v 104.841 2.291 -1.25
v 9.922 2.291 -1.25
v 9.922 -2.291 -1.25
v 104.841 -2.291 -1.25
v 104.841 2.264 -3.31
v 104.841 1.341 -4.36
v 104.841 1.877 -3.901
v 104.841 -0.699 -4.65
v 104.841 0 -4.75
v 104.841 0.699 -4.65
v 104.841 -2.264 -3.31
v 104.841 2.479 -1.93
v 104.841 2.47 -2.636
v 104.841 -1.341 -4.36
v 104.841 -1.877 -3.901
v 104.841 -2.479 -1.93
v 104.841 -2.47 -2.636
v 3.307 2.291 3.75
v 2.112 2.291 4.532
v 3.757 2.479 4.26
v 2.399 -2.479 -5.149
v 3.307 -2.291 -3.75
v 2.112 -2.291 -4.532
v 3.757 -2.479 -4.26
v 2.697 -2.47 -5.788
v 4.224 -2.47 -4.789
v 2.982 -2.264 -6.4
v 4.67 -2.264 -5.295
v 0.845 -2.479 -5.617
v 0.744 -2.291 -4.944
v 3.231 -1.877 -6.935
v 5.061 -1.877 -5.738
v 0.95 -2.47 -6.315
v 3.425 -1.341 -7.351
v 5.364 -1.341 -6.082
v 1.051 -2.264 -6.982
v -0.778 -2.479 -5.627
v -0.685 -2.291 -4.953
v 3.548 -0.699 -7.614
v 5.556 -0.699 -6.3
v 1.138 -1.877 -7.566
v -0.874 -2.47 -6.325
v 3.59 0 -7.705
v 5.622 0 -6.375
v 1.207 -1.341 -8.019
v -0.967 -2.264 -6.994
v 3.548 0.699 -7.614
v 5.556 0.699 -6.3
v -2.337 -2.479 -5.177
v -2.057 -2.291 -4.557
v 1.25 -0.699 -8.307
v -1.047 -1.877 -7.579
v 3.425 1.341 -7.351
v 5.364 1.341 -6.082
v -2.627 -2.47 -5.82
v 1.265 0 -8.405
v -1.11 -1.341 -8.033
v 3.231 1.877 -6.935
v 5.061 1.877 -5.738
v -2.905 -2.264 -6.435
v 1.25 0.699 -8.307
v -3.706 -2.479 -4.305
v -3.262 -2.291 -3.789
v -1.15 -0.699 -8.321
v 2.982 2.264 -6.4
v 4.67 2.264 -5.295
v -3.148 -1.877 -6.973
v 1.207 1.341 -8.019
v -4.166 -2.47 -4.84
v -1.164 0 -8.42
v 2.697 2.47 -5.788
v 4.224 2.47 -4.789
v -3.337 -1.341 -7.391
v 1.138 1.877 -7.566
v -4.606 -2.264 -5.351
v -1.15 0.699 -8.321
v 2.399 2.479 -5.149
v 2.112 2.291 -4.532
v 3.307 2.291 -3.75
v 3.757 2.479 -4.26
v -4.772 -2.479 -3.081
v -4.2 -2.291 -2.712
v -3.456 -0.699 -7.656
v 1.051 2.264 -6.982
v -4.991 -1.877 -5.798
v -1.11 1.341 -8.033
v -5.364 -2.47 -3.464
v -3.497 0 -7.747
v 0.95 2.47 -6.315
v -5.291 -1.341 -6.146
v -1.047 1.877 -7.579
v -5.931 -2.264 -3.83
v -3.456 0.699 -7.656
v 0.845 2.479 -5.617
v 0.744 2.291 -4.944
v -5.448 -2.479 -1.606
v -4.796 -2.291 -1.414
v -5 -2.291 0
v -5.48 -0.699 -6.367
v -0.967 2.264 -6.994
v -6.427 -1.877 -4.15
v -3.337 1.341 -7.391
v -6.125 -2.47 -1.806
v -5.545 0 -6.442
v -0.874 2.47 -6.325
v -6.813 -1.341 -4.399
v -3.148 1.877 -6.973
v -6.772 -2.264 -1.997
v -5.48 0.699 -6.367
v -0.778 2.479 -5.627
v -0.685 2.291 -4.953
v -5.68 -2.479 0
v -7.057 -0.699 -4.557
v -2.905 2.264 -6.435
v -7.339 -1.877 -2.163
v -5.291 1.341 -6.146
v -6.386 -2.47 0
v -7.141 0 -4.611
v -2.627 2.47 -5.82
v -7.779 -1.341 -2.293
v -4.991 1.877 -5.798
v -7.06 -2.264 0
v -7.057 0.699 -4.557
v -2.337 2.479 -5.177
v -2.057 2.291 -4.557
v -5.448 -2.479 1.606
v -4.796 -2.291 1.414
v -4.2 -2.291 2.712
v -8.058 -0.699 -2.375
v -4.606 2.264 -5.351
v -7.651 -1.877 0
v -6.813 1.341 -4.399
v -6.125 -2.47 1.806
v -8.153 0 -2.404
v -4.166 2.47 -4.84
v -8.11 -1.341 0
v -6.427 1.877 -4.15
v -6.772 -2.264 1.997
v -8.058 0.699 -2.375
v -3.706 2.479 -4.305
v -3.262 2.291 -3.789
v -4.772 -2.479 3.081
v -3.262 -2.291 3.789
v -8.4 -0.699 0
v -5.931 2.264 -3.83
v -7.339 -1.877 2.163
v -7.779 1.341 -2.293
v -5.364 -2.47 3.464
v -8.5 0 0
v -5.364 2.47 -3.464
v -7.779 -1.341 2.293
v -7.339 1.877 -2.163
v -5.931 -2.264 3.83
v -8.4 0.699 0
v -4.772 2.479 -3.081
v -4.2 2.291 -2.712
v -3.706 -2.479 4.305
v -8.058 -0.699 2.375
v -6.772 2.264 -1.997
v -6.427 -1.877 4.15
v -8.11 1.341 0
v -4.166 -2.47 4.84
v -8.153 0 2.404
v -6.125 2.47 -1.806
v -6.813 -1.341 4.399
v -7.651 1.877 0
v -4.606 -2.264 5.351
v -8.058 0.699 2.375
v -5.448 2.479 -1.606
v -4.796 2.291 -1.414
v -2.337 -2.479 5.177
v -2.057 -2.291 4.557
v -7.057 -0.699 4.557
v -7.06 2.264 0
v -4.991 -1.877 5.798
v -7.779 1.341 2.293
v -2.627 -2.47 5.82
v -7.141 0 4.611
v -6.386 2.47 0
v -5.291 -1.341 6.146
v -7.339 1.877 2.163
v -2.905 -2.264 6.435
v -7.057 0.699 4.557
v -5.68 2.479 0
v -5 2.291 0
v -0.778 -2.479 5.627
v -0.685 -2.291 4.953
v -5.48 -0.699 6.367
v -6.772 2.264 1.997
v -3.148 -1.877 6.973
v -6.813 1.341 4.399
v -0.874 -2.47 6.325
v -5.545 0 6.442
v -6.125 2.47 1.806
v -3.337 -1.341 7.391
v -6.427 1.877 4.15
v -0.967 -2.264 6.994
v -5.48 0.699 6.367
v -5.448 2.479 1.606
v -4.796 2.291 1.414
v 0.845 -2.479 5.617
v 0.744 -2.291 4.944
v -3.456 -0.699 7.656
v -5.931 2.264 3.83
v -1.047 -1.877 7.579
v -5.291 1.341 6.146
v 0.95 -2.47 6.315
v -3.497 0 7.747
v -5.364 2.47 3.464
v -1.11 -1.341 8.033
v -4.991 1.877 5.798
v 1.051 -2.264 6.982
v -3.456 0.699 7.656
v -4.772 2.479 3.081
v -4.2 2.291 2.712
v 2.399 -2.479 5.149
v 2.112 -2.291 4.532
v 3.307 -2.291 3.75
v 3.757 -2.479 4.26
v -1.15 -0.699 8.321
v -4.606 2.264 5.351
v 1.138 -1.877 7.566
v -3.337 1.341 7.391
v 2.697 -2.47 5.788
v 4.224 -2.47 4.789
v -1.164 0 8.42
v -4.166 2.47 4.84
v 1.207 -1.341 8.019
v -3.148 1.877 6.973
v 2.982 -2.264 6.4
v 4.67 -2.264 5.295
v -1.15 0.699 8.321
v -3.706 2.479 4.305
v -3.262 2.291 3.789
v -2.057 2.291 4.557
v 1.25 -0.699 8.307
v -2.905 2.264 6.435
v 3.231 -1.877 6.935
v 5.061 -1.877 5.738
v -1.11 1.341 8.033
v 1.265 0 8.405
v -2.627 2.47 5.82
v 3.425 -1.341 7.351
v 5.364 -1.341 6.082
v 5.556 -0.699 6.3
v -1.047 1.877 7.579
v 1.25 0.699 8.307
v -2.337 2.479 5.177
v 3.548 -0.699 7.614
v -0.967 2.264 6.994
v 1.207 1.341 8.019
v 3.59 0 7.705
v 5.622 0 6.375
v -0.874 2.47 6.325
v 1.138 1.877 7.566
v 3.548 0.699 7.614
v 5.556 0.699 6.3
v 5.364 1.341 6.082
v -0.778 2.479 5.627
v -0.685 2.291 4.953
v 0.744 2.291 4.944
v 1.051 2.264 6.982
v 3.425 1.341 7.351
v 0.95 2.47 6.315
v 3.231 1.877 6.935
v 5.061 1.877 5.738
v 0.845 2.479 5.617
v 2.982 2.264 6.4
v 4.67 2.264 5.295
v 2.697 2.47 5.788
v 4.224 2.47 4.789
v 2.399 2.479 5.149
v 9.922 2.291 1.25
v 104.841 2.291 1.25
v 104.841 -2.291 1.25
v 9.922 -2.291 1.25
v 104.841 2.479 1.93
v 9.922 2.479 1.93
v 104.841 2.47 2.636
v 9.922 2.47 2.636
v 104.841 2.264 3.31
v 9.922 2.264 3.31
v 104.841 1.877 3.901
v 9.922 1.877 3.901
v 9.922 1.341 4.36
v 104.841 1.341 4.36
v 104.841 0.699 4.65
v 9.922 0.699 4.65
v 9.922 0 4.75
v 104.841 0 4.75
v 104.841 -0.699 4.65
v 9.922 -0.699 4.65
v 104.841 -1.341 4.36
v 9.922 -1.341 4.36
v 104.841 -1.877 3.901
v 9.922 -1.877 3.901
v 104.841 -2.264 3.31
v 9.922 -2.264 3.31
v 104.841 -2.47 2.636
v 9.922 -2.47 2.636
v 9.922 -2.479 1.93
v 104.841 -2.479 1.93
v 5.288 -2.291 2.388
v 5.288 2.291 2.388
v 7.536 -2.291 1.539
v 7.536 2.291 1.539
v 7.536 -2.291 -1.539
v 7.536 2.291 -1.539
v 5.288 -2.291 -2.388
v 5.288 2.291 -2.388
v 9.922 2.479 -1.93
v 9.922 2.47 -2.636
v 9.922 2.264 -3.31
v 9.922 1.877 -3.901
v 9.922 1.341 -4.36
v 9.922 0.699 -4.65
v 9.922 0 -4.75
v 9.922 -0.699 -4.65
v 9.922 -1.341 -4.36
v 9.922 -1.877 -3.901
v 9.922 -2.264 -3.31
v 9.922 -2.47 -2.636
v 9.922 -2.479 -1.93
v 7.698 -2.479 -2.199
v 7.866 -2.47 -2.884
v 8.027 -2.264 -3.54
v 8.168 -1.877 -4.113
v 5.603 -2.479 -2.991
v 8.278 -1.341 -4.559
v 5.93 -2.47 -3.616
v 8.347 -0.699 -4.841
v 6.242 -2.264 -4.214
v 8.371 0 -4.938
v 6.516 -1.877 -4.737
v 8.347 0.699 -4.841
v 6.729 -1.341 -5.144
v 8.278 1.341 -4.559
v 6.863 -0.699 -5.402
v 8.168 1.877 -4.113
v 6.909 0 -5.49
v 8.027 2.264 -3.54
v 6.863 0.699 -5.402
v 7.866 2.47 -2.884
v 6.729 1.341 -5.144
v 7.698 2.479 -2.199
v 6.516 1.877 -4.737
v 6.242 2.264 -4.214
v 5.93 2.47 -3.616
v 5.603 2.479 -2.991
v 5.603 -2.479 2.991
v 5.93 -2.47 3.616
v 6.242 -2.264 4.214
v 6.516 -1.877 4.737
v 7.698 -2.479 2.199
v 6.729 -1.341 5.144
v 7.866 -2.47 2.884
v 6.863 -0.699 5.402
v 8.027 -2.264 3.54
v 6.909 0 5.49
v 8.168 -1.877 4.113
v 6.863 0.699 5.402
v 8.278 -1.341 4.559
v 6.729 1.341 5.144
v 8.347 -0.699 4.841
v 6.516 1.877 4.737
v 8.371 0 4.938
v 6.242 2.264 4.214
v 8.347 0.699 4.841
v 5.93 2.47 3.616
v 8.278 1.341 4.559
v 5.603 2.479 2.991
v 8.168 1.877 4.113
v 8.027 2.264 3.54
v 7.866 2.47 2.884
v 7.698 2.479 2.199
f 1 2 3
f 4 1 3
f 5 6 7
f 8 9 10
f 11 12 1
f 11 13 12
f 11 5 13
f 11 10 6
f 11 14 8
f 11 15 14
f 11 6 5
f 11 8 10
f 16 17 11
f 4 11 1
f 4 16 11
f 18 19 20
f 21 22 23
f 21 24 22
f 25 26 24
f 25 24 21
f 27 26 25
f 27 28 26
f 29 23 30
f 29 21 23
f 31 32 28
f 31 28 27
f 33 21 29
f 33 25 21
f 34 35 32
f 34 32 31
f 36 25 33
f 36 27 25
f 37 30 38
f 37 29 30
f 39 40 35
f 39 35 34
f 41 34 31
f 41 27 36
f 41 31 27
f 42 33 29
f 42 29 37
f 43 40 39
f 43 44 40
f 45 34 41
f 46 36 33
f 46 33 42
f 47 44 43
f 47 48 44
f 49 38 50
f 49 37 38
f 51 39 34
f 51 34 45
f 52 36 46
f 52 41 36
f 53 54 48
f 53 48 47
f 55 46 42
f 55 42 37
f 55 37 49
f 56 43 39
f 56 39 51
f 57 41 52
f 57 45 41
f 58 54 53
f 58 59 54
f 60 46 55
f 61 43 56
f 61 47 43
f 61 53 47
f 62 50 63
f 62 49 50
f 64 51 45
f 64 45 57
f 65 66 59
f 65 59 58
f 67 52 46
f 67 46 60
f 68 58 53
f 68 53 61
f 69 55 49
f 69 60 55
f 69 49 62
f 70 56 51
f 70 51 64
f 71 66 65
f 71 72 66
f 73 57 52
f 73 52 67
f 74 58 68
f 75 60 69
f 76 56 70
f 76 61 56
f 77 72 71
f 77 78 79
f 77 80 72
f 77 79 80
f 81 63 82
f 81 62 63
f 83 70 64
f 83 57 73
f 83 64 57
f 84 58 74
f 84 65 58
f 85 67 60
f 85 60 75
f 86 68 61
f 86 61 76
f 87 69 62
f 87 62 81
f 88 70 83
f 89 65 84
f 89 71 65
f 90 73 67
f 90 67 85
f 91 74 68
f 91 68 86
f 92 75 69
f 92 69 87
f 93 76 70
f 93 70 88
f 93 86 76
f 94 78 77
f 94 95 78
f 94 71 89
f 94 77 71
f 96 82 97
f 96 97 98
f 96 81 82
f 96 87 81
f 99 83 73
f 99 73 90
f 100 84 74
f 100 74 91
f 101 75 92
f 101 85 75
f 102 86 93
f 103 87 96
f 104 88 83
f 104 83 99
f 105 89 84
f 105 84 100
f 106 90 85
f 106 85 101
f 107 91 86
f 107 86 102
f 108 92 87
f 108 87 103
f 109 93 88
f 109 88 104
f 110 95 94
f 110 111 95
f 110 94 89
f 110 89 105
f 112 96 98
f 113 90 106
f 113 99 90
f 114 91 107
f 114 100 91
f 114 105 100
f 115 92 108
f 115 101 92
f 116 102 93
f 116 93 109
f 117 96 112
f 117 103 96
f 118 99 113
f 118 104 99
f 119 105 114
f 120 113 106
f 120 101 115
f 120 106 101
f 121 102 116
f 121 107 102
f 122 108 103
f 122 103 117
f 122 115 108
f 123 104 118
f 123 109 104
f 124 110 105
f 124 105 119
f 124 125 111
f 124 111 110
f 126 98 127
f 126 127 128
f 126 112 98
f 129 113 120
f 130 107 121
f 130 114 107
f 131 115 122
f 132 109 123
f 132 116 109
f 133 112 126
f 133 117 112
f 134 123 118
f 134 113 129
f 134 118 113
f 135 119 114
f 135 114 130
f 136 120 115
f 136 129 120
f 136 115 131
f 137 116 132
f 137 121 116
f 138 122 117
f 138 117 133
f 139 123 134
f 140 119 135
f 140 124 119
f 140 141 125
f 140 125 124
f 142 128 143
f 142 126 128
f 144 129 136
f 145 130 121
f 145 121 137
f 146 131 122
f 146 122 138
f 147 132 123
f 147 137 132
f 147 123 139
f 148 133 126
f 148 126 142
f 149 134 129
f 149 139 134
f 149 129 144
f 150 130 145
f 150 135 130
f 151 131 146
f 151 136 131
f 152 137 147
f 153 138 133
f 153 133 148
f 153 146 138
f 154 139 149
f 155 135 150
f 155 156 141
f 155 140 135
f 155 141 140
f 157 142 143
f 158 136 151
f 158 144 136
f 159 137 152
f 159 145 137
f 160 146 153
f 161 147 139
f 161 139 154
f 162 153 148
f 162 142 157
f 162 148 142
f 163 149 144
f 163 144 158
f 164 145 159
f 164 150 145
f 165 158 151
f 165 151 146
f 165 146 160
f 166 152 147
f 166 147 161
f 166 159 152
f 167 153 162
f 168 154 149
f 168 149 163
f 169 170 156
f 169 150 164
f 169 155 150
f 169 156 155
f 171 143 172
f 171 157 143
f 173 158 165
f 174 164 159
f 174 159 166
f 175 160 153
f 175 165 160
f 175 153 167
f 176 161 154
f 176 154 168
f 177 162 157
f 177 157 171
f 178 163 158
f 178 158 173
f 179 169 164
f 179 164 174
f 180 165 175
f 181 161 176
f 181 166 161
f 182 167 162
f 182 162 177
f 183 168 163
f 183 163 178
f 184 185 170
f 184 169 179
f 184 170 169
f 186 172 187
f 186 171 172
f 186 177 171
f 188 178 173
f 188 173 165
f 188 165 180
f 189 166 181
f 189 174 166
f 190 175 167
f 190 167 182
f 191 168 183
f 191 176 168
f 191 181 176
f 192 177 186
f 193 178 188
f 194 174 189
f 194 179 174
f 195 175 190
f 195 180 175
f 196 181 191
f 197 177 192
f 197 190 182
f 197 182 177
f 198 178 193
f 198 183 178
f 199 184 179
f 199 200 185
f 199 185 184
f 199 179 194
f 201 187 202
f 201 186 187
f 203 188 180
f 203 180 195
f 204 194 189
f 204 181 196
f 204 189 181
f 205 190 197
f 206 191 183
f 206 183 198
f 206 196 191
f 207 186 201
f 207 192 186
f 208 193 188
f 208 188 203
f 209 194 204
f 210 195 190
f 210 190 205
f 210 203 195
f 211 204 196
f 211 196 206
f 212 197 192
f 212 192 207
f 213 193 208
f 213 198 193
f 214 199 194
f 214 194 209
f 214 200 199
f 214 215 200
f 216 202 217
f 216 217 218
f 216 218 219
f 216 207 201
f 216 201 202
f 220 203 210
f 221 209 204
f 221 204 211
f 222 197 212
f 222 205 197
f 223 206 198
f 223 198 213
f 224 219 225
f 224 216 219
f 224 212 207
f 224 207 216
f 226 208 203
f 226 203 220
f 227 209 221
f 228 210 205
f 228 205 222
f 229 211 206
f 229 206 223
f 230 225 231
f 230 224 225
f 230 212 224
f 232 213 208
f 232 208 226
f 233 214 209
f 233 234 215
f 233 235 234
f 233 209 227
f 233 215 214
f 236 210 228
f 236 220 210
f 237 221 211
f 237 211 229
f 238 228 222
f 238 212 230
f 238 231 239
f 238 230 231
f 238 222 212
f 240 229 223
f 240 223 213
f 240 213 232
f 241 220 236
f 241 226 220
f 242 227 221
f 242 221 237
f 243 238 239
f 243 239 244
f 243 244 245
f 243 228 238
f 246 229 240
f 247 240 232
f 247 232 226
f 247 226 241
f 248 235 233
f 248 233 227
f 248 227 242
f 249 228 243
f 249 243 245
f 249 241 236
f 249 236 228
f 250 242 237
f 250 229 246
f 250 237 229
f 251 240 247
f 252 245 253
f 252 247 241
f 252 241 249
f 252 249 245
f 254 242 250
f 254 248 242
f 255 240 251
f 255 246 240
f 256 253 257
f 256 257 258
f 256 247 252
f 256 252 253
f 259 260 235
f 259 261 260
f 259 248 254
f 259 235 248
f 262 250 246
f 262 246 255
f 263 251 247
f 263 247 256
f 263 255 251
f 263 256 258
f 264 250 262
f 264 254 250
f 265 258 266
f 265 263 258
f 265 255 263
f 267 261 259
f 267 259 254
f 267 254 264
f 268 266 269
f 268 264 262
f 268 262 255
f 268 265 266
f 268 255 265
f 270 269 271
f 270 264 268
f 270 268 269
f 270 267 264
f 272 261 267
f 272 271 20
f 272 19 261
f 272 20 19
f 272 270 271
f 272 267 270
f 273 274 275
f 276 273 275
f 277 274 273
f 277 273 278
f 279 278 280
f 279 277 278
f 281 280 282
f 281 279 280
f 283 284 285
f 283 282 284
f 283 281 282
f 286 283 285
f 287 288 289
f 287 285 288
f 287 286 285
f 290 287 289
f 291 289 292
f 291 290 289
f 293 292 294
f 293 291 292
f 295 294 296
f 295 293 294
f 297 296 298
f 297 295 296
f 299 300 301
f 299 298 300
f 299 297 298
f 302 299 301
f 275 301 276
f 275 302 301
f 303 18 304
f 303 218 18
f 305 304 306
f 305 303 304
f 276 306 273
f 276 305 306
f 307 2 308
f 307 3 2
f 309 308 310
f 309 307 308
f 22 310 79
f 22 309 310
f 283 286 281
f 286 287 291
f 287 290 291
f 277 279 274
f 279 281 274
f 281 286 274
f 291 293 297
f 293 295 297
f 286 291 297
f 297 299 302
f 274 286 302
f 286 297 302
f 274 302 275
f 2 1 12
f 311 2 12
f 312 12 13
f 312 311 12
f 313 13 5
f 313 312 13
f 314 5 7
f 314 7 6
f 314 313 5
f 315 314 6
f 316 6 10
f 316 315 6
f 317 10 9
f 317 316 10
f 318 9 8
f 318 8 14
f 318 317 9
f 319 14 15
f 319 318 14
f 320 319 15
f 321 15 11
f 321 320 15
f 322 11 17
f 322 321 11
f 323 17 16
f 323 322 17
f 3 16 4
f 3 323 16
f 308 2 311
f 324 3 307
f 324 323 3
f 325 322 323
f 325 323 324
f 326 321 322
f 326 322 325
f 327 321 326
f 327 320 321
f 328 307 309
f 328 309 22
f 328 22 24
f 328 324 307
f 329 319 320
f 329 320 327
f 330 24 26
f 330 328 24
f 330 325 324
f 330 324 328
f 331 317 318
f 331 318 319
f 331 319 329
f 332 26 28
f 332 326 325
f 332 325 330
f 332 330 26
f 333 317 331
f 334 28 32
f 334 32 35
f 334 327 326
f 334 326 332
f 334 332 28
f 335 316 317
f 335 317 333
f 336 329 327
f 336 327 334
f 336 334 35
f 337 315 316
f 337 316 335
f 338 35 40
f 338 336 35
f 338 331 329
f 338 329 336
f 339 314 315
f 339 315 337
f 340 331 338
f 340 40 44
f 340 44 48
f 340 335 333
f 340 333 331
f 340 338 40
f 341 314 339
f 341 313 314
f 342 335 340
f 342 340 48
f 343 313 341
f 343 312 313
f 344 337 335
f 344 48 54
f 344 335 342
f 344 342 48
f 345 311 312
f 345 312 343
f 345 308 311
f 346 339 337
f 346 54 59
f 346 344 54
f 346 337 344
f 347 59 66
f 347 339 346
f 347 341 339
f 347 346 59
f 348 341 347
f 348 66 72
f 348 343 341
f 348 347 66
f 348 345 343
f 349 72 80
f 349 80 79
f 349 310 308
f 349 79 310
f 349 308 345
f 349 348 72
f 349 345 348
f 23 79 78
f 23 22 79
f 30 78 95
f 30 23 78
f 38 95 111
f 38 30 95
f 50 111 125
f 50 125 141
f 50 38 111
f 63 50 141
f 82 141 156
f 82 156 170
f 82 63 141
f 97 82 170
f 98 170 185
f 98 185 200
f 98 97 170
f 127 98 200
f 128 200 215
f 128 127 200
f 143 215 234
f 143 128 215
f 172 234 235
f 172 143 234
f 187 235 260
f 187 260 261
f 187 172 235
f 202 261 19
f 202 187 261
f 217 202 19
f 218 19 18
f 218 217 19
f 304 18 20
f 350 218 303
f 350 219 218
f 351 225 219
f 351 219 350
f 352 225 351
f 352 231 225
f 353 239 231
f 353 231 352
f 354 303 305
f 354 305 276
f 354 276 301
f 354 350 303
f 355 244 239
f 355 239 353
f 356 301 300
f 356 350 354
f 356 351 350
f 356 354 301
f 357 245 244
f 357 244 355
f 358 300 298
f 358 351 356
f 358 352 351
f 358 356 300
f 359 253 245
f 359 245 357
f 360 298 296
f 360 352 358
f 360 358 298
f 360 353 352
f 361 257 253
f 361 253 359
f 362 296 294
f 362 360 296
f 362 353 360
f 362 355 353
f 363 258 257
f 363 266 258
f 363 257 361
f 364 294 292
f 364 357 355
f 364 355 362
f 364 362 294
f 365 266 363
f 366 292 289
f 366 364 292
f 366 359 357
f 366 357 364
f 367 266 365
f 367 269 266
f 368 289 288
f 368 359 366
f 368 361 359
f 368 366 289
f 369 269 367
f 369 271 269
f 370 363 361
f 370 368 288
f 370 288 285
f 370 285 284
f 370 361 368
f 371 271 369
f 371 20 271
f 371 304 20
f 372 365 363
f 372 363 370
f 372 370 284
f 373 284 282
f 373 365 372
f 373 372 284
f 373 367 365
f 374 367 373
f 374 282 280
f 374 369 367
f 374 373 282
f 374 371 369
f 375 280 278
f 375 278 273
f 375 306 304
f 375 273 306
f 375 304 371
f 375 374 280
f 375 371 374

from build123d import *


with BuildPart() as part:
    # Sweep1: sweep along a path in Sketch2
    with BuildLine(Plane(origin=(0, 0, 0), x_dir=(1, 0, 0), z_dir=(0, 1, 0))) as sweep1_path:
        Line((104.841229183, 1.25), (9.921567416, 1.25))
        ThreePointArc((9.921567416, 1.25), (6.386033511, 1.895856533), (3.307189139, 3.75))
        ThreePointArc((3.307189139, 3.75), (-5, 0), (3.307189139, -3.75))
        ThreePointArc((3.307189139, -3.75), (6.386033511, -1.895856533), (9.921567416, -1.25))
        Line((9.921567416, -1.25), (104.841229183, -1.25))
    # Sketch3 → Sweep1 (sweep)
    with BuildSketch(Plane.ZY.offset(-104.841229183)):
        with BuildLine():
            Line((1.25, 2.291287847), (1.25, -2.291287847))
            ThreePointArc((1.25, -2.291287847), (4.75, 0), (1.25, 2.291287847))
        make_face()
    sweep(path=sweep1_path.line)


solid = part.part
